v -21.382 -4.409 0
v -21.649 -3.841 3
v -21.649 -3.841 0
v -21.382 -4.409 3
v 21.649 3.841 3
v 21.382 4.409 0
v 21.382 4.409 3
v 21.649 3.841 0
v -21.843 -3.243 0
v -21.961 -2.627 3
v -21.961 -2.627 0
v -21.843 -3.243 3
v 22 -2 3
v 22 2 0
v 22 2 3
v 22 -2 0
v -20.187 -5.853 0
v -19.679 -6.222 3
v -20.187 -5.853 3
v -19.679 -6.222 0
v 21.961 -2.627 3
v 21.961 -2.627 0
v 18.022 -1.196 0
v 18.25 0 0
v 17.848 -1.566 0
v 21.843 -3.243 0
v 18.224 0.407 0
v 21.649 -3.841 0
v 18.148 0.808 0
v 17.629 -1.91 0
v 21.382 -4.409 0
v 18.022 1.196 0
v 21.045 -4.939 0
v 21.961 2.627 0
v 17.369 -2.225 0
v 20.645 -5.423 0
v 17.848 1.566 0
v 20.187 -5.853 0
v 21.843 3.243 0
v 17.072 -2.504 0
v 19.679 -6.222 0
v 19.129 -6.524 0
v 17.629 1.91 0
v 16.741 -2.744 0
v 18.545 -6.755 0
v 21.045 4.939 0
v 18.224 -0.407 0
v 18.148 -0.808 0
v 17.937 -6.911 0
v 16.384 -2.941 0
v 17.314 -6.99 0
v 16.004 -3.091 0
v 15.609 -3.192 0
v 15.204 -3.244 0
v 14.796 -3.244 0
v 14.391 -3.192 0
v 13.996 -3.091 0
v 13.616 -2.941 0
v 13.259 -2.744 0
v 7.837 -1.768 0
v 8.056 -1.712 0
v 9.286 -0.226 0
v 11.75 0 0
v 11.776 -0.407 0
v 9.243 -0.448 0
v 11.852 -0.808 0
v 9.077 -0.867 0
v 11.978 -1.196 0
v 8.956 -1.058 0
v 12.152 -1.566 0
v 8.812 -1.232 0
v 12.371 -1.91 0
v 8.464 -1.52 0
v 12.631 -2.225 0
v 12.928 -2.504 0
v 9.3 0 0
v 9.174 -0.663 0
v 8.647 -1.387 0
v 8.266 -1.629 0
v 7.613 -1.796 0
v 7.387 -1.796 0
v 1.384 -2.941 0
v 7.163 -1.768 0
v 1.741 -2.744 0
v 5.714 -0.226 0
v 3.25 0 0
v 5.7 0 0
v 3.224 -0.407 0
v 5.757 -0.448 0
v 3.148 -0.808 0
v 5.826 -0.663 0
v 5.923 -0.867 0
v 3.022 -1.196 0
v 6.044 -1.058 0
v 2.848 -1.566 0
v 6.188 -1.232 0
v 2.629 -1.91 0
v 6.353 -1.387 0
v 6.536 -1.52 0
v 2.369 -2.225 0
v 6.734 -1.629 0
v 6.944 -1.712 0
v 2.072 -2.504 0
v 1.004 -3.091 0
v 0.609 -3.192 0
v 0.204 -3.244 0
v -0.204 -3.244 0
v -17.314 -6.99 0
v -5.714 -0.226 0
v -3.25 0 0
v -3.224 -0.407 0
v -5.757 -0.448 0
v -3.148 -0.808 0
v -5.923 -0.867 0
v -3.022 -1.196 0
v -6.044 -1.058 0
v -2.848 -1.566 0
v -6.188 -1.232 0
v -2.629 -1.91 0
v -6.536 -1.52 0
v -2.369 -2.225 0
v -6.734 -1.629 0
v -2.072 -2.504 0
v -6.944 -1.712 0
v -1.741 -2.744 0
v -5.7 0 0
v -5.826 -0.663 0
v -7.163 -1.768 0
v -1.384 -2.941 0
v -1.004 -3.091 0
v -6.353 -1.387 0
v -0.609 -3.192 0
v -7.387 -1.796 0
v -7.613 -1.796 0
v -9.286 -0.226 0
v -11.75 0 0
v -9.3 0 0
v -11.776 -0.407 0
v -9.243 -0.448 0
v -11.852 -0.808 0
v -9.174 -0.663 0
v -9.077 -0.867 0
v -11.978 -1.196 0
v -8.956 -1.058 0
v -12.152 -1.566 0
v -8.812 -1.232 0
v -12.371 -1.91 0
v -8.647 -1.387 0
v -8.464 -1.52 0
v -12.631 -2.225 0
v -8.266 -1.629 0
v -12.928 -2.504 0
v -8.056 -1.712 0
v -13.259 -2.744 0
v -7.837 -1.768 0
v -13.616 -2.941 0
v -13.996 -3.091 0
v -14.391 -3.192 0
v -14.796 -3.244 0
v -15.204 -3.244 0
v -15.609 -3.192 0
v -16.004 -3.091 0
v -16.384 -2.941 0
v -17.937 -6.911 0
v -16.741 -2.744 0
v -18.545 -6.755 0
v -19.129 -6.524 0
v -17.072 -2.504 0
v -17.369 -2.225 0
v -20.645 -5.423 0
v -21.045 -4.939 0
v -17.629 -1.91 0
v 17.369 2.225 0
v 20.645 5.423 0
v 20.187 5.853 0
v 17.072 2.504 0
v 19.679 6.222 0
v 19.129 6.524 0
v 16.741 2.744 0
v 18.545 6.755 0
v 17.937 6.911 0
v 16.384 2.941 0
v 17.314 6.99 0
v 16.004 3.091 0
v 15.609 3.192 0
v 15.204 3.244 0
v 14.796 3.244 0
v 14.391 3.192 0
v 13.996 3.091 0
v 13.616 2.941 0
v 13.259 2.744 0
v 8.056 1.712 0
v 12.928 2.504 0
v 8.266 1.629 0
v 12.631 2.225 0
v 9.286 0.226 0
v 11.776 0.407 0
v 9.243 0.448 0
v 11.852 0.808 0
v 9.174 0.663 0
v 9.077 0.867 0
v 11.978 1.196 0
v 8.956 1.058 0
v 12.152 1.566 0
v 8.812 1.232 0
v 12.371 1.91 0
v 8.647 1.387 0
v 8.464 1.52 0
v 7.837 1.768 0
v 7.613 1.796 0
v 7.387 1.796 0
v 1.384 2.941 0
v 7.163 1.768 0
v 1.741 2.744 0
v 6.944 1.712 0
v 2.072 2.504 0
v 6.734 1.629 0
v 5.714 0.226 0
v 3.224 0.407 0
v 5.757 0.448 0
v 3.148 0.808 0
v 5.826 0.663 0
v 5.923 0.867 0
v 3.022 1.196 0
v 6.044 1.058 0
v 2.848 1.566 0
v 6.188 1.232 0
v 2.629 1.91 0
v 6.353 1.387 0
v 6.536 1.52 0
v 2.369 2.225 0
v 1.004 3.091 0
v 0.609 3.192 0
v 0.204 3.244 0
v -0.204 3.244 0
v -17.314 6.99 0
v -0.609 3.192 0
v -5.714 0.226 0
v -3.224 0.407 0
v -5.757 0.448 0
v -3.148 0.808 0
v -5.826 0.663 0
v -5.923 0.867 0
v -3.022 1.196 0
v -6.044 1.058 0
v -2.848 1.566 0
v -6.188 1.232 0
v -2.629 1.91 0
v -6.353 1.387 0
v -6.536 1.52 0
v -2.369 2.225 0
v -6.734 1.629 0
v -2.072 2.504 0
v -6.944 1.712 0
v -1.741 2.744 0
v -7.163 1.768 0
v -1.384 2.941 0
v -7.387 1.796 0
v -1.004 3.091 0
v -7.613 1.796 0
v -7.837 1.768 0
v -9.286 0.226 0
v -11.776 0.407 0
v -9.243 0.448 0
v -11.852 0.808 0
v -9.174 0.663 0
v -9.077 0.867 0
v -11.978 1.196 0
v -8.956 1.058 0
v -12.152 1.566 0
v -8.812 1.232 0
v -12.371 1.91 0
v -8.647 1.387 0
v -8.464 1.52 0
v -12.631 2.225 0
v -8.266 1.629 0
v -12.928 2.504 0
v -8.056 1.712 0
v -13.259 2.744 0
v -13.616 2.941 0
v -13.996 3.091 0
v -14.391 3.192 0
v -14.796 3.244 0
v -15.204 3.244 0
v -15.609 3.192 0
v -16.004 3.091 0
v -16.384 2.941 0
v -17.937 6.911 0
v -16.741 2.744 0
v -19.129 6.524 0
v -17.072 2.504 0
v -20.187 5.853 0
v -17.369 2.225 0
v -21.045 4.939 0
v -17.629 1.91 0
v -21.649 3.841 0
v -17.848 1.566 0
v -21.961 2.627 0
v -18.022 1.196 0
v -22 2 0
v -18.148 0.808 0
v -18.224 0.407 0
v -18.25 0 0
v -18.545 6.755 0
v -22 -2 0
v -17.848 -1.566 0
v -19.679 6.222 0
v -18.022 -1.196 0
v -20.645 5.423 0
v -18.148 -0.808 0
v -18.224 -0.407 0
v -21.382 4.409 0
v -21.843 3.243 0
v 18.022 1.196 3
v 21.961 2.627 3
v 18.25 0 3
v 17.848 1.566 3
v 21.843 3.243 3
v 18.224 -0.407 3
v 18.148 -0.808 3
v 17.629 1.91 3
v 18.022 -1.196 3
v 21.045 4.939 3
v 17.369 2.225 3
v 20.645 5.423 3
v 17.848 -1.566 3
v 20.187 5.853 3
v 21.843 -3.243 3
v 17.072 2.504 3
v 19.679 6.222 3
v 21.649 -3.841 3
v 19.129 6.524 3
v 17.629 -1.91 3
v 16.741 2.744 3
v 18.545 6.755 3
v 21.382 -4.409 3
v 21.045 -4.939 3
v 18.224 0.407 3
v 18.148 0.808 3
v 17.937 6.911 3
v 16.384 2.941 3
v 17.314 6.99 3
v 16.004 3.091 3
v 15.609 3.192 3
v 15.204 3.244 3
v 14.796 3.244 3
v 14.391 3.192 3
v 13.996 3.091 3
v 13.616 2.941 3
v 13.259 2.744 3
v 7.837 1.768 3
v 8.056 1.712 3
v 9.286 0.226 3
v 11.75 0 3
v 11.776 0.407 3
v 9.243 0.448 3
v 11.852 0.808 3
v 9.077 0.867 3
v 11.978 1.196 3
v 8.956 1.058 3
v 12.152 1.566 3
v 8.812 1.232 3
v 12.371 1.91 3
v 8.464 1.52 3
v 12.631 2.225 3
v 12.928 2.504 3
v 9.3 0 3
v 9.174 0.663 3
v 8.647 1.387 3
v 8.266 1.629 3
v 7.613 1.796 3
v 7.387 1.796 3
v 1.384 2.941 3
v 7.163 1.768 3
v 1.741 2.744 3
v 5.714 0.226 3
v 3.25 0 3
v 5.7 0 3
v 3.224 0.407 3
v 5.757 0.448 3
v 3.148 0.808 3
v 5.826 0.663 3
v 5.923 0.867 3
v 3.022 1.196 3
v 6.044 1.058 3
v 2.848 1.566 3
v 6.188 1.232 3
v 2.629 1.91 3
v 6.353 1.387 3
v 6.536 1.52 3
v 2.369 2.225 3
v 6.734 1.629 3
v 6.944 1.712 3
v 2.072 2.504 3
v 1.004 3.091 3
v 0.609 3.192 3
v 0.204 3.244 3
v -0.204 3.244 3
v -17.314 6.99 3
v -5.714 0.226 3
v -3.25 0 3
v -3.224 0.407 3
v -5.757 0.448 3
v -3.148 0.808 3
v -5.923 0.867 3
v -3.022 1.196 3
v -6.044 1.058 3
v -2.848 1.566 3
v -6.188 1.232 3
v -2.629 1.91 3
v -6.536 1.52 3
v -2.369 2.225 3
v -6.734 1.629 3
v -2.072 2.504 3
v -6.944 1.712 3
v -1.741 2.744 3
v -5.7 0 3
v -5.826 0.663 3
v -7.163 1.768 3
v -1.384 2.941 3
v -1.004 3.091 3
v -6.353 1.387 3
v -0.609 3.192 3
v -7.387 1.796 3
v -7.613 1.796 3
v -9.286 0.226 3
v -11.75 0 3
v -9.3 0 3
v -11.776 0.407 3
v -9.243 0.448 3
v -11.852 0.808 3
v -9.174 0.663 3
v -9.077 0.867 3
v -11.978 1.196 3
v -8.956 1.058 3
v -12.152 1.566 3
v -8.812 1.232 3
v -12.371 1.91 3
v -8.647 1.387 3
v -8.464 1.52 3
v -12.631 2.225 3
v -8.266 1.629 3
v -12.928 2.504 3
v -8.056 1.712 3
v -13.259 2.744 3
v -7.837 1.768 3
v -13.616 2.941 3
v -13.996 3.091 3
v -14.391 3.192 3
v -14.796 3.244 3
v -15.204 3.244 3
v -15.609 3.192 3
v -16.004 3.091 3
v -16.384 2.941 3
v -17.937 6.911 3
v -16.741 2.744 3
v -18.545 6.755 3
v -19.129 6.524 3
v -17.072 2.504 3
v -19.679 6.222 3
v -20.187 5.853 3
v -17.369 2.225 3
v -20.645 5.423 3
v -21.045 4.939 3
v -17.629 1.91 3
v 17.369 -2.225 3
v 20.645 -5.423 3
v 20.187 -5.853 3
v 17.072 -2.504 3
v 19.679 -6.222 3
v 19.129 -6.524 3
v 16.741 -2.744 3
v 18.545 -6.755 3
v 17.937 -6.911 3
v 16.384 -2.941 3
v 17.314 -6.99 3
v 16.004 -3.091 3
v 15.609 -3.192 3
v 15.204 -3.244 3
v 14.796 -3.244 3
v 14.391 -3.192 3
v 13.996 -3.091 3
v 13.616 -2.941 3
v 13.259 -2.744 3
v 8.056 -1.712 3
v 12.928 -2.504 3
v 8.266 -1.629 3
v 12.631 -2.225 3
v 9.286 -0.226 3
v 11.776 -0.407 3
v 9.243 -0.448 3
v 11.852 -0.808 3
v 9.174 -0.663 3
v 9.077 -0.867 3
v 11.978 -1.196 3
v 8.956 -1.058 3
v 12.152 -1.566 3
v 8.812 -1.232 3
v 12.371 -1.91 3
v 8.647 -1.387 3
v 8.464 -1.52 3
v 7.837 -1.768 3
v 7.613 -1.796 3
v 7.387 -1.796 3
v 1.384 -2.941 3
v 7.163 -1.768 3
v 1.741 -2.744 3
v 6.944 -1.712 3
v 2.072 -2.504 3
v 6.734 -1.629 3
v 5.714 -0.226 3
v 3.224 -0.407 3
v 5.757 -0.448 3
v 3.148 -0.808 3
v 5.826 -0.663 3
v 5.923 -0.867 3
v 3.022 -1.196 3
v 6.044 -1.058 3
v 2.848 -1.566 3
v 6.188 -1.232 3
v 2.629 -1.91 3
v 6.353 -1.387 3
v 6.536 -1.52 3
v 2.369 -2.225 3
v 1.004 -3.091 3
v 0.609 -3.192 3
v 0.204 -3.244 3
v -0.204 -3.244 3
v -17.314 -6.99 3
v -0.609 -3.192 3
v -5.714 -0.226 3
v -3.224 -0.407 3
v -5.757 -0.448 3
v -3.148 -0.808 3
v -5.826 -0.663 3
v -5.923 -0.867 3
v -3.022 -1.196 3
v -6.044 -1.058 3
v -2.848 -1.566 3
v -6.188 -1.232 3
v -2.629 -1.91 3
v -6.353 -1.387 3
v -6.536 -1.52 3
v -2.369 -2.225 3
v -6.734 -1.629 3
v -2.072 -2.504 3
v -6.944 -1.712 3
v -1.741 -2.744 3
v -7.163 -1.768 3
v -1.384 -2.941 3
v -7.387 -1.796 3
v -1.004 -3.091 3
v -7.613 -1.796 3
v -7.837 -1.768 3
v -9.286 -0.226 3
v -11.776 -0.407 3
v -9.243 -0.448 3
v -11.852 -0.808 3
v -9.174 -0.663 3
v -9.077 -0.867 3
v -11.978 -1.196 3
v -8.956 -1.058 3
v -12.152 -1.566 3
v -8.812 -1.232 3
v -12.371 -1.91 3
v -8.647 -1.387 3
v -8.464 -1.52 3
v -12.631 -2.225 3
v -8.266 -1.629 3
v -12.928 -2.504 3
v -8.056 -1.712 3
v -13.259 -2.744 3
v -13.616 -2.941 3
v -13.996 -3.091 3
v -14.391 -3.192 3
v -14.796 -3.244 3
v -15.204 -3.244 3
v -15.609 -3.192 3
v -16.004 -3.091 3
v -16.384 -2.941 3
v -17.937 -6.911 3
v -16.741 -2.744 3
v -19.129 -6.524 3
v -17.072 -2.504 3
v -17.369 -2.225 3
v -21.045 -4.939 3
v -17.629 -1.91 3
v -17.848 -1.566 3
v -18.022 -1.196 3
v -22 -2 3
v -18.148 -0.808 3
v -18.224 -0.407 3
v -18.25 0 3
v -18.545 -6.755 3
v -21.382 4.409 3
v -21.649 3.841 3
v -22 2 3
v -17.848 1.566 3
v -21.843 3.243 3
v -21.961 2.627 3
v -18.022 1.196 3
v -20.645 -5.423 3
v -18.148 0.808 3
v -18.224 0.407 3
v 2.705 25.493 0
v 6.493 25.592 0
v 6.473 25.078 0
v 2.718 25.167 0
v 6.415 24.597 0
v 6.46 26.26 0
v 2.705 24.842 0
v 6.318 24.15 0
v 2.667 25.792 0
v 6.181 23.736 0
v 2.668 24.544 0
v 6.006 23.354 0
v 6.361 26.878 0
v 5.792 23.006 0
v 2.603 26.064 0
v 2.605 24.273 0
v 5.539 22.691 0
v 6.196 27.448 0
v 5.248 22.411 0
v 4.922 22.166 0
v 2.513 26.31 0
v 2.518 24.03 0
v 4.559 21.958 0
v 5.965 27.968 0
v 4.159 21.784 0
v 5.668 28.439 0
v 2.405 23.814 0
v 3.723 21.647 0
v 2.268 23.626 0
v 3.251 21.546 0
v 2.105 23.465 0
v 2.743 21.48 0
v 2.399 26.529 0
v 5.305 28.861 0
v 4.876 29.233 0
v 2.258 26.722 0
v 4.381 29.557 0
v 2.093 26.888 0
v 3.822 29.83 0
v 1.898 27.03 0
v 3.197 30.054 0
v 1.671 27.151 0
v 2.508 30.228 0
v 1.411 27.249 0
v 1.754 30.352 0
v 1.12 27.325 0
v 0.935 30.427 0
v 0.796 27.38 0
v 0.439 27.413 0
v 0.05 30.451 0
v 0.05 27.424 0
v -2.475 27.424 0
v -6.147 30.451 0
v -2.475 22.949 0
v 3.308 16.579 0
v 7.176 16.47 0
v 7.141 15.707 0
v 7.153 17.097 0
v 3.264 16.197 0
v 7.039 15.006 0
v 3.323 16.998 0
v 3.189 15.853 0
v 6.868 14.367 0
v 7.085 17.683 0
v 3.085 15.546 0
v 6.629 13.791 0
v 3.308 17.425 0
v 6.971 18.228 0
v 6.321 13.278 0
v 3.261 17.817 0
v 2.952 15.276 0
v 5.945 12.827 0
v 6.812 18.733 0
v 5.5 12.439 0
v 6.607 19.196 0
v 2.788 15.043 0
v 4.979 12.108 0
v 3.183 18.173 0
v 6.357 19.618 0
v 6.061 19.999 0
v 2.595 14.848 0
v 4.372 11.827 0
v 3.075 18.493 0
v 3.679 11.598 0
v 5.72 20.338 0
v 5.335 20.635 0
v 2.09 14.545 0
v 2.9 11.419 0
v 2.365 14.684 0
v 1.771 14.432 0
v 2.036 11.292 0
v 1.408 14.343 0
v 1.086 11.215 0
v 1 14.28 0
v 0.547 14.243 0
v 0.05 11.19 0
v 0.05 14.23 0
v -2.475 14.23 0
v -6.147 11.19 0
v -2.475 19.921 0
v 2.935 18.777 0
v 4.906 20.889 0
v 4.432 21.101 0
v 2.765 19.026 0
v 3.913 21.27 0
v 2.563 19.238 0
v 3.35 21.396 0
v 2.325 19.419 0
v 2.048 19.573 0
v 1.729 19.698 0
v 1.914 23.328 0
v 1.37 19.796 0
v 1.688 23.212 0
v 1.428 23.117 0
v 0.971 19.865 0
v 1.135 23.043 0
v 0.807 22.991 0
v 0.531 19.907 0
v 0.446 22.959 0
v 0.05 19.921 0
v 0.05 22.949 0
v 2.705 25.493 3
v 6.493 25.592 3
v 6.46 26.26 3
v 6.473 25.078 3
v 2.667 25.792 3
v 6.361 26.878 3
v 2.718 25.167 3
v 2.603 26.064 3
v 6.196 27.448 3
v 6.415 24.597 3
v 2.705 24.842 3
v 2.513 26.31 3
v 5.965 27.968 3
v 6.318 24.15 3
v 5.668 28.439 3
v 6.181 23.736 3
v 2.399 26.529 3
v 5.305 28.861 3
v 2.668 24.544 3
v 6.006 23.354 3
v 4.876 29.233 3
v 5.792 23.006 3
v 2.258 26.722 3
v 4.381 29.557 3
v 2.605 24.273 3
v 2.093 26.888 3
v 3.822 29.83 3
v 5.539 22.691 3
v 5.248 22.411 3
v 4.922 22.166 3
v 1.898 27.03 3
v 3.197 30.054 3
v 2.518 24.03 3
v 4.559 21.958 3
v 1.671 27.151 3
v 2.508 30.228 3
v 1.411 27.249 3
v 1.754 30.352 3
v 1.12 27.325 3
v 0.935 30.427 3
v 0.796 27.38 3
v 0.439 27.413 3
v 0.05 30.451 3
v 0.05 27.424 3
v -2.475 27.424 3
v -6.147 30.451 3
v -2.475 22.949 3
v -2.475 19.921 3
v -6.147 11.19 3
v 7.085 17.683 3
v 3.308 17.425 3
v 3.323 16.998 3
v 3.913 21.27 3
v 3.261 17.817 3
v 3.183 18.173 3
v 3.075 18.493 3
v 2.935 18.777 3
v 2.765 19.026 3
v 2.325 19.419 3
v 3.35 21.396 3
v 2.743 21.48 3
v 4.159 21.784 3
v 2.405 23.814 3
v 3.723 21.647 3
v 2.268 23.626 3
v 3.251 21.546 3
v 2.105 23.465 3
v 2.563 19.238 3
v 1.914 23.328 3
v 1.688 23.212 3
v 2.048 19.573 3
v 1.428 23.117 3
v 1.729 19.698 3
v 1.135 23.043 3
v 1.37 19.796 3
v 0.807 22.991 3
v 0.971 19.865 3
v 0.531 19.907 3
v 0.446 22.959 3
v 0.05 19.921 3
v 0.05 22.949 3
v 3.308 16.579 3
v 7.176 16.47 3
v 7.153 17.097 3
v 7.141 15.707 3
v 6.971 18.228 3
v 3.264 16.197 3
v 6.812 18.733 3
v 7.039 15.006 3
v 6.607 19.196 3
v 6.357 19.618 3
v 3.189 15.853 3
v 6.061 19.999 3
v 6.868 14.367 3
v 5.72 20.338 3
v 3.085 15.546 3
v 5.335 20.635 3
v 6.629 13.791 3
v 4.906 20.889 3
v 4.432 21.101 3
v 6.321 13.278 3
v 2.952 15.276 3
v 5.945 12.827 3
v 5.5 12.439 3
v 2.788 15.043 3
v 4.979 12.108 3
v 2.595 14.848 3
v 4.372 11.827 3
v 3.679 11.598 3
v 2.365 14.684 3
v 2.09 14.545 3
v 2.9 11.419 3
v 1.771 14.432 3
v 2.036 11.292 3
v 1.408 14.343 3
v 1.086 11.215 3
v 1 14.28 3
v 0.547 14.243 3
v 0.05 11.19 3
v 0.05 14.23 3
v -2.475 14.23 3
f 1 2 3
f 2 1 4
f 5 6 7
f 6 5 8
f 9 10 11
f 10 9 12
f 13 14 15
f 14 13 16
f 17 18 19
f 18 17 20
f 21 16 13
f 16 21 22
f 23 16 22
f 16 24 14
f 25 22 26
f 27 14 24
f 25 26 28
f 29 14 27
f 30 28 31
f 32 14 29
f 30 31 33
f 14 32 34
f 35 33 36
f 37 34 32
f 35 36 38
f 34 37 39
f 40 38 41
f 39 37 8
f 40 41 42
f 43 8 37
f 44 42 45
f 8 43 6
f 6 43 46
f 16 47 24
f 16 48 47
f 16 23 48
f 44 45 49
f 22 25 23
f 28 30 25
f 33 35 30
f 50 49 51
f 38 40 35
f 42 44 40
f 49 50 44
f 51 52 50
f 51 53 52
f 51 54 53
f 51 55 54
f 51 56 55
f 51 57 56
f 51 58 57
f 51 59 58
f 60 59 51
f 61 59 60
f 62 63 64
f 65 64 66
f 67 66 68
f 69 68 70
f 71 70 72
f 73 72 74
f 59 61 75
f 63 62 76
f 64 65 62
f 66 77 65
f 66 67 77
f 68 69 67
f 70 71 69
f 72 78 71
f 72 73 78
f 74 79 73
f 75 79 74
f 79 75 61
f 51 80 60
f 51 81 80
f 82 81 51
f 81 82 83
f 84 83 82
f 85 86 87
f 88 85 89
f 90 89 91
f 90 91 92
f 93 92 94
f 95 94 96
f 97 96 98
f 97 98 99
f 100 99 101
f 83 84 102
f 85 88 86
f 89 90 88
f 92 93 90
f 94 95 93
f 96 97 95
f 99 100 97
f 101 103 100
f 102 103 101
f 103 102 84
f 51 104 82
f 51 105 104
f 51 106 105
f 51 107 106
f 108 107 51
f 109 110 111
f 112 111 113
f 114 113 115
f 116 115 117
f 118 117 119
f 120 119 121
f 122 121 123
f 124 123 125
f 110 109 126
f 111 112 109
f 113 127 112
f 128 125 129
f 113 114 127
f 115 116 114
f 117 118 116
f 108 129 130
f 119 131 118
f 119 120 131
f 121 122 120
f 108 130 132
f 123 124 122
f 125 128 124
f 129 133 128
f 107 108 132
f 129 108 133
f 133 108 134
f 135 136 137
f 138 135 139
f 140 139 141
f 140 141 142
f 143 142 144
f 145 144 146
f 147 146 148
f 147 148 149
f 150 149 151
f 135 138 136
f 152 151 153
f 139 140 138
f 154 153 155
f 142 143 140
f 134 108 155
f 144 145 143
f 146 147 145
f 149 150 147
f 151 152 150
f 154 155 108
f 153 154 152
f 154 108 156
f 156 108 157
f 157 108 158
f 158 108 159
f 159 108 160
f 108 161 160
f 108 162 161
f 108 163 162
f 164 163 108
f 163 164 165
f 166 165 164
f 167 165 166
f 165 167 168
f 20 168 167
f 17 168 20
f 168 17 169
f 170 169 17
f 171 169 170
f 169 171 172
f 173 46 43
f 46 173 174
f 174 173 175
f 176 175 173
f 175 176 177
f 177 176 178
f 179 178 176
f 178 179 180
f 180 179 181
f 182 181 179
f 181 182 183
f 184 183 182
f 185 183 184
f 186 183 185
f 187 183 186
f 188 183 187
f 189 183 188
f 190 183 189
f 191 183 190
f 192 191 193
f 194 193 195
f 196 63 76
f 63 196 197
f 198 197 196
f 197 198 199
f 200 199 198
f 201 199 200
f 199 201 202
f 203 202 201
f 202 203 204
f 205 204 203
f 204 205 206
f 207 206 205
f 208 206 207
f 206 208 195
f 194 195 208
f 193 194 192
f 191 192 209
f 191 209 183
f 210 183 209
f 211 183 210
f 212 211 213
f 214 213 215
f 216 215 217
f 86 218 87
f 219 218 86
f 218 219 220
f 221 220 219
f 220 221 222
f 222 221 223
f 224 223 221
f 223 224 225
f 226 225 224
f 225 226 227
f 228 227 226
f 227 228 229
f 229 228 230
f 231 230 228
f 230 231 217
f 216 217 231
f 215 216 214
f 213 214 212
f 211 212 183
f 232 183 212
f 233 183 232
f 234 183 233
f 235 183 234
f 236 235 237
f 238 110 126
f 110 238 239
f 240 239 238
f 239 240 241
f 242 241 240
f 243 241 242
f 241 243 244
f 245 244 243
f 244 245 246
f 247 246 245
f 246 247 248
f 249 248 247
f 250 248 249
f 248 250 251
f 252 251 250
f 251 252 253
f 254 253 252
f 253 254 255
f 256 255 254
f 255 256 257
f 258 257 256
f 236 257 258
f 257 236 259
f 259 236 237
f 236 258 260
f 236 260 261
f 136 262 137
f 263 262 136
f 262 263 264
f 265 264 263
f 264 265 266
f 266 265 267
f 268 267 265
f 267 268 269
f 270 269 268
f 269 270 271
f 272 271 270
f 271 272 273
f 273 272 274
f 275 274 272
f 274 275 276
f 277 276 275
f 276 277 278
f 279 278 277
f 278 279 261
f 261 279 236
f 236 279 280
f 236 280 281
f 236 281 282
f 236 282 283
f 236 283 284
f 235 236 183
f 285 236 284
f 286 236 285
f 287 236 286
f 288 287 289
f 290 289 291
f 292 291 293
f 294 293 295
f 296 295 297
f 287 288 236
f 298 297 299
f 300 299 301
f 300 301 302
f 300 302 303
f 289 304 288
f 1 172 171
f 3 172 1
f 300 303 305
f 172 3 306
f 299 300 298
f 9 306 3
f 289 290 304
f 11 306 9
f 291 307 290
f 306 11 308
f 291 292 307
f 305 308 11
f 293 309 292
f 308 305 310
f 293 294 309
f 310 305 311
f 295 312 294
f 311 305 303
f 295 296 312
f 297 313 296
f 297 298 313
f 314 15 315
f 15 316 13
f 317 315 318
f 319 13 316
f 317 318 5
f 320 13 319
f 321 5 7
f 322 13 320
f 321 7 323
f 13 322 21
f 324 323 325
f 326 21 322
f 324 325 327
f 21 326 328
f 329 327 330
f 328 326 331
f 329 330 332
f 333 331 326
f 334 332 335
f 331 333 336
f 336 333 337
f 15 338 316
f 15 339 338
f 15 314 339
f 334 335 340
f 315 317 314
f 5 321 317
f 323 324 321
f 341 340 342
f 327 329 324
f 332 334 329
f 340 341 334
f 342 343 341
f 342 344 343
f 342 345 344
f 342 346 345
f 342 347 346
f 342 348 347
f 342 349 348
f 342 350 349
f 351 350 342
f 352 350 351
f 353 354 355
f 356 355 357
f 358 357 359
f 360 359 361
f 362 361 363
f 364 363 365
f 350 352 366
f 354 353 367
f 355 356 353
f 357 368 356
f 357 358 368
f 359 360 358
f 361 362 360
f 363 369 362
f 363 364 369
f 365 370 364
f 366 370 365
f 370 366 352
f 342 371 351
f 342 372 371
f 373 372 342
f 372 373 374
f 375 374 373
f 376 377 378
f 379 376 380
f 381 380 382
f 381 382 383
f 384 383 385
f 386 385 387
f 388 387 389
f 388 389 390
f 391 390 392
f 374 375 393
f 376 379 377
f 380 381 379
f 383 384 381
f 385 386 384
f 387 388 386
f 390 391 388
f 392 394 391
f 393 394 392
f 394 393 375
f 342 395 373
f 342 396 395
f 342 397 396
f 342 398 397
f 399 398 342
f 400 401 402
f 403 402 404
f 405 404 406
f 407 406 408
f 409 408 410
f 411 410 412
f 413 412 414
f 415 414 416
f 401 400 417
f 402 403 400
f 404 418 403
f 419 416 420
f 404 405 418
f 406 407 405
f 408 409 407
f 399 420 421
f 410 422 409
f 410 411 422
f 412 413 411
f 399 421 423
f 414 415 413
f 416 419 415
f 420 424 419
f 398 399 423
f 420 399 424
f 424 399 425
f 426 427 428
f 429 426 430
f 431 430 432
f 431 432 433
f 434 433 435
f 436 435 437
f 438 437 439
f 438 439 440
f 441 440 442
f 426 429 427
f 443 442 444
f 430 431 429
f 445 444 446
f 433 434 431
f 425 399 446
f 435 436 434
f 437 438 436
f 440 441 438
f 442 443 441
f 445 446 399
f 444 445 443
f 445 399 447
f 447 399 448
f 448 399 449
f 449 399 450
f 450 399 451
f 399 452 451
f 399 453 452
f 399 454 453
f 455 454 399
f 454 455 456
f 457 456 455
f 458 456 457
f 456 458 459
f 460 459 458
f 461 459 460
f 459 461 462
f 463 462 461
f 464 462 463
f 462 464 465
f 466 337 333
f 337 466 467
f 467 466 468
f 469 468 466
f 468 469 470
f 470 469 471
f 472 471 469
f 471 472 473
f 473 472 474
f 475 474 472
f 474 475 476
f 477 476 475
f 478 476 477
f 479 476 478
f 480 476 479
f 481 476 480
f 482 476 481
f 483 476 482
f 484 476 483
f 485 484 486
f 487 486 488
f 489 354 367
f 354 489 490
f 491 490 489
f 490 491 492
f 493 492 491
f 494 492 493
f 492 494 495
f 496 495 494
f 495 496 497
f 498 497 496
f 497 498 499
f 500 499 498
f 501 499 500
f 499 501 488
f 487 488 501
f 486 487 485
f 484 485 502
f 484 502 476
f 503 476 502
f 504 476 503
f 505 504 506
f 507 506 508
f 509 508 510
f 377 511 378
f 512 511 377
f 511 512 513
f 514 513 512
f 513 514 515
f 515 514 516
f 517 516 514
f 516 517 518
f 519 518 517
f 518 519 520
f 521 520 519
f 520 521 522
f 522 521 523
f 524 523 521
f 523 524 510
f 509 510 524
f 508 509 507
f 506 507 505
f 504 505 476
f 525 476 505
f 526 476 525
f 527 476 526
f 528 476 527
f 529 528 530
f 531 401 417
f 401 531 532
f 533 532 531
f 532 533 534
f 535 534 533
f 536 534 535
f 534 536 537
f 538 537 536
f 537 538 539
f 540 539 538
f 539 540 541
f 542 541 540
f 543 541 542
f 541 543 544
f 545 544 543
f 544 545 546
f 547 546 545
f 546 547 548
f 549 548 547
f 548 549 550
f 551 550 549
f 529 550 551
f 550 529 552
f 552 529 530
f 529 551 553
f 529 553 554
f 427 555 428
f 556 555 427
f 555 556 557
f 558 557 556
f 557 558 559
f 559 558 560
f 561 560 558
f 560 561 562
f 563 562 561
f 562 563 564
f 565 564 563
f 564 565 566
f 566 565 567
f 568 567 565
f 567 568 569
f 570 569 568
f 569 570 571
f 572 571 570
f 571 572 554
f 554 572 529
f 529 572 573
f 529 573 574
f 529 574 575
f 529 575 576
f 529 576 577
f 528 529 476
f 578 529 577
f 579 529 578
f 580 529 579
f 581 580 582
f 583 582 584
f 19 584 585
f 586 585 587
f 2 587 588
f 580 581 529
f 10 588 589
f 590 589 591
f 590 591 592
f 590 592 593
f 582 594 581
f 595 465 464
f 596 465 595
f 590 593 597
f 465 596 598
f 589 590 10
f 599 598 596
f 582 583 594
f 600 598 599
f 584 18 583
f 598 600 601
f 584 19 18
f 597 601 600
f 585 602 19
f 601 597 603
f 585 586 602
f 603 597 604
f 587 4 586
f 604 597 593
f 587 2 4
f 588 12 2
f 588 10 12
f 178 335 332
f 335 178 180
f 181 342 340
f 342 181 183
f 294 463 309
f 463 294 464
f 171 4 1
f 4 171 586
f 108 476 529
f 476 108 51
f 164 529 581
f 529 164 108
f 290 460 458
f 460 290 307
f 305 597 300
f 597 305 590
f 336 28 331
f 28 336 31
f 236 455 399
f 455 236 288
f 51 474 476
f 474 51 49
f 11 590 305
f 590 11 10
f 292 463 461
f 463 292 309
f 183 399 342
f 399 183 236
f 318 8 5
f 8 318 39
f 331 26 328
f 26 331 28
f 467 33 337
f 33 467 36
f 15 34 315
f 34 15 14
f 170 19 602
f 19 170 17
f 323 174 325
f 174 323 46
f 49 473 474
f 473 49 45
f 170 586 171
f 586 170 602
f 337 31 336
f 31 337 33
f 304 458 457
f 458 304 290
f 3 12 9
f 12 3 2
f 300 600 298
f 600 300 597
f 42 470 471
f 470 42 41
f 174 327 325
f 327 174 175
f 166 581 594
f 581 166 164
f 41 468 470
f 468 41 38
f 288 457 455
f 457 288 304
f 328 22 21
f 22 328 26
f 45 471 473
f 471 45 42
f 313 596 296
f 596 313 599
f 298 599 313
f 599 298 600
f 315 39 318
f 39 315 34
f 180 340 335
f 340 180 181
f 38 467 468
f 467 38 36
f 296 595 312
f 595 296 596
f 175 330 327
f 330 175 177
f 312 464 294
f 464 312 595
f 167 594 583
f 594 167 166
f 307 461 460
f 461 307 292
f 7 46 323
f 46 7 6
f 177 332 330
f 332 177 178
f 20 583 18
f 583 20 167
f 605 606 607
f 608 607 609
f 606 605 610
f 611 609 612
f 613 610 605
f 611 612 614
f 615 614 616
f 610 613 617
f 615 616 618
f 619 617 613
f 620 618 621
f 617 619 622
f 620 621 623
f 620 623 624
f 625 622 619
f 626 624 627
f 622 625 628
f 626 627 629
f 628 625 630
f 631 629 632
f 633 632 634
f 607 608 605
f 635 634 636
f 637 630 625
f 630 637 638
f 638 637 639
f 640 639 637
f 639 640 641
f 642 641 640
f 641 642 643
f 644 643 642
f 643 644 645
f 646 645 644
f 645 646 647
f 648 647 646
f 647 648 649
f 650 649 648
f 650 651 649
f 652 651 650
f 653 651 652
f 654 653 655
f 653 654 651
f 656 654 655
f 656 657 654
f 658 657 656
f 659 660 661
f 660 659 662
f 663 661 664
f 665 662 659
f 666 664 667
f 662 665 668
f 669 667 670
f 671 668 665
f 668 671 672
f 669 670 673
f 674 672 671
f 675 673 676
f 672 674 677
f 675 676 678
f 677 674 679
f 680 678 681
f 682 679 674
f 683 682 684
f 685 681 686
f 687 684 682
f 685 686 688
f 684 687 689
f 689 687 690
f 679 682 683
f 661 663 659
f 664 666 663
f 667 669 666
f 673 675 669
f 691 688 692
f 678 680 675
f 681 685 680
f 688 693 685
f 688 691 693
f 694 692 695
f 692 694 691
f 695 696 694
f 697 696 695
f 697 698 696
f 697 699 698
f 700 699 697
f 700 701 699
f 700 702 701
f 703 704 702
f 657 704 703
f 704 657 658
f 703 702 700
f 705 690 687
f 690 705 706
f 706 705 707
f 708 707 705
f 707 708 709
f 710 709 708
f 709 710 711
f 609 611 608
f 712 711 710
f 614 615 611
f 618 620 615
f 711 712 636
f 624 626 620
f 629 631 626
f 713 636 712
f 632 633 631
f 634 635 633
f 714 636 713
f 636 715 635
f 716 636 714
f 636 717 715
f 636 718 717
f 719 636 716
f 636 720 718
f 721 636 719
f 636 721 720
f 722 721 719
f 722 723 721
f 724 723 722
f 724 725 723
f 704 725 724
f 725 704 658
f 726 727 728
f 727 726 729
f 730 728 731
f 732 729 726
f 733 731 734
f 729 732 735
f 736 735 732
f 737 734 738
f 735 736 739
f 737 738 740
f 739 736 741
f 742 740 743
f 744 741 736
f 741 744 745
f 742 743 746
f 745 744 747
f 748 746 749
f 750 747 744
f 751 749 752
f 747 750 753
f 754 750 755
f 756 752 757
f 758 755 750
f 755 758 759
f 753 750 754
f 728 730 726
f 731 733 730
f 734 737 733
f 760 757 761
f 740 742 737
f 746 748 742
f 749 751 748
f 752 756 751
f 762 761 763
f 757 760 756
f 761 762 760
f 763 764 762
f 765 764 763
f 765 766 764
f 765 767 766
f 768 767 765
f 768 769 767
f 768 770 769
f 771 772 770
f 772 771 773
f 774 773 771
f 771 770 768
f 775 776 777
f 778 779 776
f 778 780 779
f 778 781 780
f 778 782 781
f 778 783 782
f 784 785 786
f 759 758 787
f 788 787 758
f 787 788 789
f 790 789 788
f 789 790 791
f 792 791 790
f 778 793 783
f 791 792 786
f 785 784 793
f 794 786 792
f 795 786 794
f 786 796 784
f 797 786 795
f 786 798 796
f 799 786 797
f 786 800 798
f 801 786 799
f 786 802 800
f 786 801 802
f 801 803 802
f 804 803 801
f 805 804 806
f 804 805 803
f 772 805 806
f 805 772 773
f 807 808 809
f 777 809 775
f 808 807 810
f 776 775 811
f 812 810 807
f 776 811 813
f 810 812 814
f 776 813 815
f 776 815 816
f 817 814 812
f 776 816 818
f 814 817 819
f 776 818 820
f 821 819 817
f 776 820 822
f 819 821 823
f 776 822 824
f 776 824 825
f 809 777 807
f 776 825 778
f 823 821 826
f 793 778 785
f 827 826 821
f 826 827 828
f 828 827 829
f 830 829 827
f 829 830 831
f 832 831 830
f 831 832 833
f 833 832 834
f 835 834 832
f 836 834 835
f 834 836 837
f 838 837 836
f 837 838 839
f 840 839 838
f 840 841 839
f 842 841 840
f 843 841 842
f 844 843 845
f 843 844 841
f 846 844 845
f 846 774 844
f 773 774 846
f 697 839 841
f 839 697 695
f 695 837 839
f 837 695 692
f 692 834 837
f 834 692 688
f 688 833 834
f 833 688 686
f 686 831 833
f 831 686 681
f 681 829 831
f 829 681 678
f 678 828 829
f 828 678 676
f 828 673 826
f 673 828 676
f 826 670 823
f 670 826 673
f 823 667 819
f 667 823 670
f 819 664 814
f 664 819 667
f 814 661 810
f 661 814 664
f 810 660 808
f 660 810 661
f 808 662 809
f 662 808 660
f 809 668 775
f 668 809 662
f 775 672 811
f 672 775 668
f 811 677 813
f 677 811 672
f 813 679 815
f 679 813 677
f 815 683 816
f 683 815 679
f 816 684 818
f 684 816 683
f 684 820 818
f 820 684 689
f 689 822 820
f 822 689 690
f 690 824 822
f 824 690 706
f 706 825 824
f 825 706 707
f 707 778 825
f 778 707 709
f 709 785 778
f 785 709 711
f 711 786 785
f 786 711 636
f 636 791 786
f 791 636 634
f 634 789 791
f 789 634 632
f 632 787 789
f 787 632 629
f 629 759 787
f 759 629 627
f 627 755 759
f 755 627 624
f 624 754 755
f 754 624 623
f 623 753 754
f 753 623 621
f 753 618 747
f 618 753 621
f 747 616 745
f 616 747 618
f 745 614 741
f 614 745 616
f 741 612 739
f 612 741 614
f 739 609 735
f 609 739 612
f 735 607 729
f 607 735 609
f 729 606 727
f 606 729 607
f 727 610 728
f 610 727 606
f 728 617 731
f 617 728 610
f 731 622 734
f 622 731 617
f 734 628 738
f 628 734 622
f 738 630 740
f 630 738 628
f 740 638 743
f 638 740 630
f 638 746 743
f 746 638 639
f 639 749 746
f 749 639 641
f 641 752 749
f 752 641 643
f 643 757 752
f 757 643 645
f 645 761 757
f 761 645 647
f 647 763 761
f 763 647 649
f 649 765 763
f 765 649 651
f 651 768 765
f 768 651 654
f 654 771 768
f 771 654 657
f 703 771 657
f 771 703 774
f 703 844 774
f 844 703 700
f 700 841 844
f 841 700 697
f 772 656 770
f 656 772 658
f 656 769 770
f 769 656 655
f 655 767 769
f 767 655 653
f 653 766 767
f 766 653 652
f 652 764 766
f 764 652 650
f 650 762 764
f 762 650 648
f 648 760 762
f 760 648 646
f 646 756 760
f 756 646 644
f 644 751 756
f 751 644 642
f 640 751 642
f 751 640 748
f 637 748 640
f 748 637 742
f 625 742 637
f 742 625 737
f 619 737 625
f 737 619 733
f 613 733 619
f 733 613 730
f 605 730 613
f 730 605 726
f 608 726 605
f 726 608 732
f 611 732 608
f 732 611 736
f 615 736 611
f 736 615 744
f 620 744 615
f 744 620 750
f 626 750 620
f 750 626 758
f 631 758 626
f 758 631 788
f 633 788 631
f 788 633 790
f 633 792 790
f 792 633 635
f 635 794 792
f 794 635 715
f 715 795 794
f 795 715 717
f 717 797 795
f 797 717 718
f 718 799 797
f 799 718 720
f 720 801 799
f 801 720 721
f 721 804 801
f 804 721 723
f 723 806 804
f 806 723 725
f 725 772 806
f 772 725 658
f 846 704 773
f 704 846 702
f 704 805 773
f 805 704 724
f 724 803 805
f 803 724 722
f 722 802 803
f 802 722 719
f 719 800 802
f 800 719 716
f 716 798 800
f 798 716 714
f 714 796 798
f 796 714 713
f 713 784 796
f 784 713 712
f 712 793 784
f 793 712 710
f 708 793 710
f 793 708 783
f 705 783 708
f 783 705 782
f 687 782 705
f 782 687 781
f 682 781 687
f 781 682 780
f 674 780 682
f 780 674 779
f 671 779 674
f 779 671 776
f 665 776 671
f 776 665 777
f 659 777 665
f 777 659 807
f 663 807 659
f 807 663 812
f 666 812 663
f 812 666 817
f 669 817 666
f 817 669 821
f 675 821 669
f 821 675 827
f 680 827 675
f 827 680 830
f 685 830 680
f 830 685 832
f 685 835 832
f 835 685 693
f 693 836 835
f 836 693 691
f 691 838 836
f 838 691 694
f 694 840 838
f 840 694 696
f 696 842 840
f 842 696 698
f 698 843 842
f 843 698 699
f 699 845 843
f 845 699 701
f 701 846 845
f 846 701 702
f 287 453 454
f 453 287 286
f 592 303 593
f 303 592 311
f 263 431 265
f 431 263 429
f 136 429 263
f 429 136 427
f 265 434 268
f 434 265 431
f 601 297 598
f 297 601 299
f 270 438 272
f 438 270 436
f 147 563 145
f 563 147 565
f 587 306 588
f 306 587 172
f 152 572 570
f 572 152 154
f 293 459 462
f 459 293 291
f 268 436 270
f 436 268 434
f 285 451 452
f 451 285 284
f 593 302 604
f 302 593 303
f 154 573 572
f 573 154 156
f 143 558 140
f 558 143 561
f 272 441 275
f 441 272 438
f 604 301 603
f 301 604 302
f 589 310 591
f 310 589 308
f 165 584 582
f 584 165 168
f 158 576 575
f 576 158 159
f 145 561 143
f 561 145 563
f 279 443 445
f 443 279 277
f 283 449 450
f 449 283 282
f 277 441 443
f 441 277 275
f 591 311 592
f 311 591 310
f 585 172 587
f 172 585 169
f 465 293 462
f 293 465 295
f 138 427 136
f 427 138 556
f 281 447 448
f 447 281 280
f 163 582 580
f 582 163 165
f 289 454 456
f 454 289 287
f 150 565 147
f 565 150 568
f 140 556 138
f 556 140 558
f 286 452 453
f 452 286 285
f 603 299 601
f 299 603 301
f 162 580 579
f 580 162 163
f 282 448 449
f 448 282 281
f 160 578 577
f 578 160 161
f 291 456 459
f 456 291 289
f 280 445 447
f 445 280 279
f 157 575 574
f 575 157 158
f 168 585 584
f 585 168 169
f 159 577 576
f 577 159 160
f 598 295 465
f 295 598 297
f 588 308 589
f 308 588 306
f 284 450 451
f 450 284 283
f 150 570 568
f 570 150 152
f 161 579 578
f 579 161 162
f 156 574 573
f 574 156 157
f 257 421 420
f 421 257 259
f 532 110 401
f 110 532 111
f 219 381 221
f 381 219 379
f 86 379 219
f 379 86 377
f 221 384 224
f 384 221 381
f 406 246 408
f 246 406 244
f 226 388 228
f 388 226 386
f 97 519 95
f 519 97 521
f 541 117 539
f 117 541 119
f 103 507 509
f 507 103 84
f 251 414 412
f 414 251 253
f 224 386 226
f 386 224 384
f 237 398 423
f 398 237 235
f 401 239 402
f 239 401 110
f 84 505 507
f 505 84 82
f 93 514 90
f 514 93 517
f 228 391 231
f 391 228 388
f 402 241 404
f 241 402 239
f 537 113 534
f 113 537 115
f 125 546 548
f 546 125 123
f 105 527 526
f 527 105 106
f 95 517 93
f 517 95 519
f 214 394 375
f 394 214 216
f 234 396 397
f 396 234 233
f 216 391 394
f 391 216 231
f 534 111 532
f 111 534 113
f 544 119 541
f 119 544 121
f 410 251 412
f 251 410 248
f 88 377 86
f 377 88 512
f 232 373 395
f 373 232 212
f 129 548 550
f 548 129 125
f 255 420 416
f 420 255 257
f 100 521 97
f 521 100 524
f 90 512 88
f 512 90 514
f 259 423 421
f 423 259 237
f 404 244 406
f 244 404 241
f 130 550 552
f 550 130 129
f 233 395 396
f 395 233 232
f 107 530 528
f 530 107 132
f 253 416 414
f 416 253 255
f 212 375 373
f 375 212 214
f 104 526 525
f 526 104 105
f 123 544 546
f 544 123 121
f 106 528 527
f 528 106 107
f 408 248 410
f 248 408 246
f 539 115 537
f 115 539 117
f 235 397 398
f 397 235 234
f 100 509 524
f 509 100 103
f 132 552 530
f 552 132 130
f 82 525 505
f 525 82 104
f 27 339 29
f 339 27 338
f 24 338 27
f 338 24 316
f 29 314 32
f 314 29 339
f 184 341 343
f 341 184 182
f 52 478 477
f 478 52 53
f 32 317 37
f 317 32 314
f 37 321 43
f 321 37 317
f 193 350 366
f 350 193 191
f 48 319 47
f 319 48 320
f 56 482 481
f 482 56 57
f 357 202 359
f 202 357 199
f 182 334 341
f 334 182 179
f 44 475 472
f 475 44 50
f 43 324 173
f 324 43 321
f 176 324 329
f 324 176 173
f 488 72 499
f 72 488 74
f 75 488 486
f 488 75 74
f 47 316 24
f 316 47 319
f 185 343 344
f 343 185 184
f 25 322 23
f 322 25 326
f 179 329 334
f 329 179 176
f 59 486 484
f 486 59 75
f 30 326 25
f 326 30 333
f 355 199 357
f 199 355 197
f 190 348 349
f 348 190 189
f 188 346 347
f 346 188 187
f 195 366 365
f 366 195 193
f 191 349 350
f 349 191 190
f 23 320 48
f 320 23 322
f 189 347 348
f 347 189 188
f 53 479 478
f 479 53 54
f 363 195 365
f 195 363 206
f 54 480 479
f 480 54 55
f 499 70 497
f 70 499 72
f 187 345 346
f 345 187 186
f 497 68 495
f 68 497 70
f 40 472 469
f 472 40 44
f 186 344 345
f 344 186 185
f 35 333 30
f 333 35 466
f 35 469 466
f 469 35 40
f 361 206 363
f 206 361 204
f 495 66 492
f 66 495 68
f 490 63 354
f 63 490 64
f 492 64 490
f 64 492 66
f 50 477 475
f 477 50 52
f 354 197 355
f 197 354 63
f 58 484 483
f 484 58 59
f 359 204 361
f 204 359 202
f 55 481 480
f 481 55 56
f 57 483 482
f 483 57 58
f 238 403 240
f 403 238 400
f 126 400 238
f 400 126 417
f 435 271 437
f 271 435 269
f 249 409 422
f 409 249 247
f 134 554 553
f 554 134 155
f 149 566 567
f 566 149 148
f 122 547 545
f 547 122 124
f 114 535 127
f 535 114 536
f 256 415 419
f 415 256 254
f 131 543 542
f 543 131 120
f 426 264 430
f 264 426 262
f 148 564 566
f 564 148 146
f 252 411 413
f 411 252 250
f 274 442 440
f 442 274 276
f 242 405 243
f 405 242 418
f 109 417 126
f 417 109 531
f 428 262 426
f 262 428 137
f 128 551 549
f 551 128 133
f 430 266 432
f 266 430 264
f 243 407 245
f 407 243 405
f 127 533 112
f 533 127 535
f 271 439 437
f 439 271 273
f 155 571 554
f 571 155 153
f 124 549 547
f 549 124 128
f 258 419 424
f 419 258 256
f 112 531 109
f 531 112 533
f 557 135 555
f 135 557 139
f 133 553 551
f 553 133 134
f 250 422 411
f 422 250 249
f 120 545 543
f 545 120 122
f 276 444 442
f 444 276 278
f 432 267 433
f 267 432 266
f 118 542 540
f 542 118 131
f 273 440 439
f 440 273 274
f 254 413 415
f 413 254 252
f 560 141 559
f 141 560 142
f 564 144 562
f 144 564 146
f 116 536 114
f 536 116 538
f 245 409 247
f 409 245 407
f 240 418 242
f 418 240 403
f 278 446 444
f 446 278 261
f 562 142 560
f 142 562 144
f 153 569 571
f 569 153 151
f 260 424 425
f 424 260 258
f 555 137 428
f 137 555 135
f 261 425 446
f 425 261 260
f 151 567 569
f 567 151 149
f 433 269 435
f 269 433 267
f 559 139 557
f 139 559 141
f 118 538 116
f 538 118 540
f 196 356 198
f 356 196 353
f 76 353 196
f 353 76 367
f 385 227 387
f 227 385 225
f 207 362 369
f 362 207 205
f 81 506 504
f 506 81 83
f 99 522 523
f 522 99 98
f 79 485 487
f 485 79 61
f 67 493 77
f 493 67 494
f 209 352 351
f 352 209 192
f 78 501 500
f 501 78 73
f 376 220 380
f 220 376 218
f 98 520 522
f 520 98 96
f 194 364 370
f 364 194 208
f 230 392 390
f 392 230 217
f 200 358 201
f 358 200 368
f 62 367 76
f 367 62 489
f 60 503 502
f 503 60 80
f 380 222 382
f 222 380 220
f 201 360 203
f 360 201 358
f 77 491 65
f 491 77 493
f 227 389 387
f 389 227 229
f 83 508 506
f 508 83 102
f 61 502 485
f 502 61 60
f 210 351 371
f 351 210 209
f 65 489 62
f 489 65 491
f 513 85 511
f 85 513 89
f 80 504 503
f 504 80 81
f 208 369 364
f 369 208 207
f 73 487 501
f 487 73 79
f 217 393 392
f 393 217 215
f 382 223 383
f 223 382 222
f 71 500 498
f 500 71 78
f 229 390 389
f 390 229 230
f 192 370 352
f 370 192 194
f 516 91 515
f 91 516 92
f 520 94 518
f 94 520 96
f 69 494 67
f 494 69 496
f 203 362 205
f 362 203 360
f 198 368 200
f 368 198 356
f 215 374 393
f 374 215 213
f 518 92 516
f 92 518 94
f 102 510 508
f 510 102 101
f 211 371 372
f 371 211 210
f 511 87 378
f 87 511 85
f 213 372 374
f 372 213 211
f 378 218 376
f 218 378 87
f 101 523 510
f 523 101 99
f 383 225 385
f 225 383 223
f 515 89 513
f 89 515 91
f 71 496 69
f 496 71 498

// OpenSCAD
$fn = 50;


difference() {
	union() {
		hull() {
			translate(v = [-17.0000000000, 2.0000000000, 0]) {
				cylinder(h = 3, r = 5);
			}
			translate(v = [17.0000000000, 2.0000000000, 0]) {
				cylinder(h = 3, r = 5);
			}
			translate(v = [-17.0000000000, -2.0000000000, 0]) {
				cylinder(h = 3, r = 5);
			}
			translate(v = [17.0000000000, -2.0000000000, 0]) {
				cylinder(h = 3, r = 5);
			}
		}
		translate(v = [0, 30.0000000000, 0]) {
			linear_extrude(height = 3) {
				text(font = "DejaVu Sans Mono:style=Bold", halign = "center", size = 19.0000000000, text = "B", valign = "top");
			}
		}
	}
	union() {
		translate(v = [-15.0000000000, 0.0000000000, 0]) {
			translate(v = [0, 0, -100]) {
				cylinder(h = 200, r = 3.2500000000);
			}
		}
		translate(v = [0, 0, -100]) {
			cylinder(h = 200, r = 3.2500000000);
		}
		translate(v = [15.0000000000, 0.0000000000, 0]) {
			translate(v = [0, 0, -100]) {
				cylinder(h = 200, r = 3.2500000000);
			}
		}
		translate(v = [-15.0000000000, 0.0000000000, 0]) {
			translate(v = [0, 0, -100]) {
				cylinder(h = 200, r = 1.8000000000);
			}
		}
		translate(v = [-7.5000000000, 0.0000000000, 0]) {
			translate(v = [0, 0, -100]) {
				cylinder(h = 200, r = 1.8000000000);
			}
		}
		translate(v = [0, 0, -100]) {
			cylinder(h = 200, r = 1.8000000000);
		}
		translate(v = [7.5000000000, 0.0000000000, 0]) {
			translate(v = [0, 0, -100]) {
				cylinder(h = 200, r = 1.8000000000);
			}
		}
		translate(v = [15.0000000000, 0.0000000000, 0]) {
			translate(v = [0, 0, -100]) {
				cylinder(h = 200, r = 1.8000000000);
			}
		}
	}
}
